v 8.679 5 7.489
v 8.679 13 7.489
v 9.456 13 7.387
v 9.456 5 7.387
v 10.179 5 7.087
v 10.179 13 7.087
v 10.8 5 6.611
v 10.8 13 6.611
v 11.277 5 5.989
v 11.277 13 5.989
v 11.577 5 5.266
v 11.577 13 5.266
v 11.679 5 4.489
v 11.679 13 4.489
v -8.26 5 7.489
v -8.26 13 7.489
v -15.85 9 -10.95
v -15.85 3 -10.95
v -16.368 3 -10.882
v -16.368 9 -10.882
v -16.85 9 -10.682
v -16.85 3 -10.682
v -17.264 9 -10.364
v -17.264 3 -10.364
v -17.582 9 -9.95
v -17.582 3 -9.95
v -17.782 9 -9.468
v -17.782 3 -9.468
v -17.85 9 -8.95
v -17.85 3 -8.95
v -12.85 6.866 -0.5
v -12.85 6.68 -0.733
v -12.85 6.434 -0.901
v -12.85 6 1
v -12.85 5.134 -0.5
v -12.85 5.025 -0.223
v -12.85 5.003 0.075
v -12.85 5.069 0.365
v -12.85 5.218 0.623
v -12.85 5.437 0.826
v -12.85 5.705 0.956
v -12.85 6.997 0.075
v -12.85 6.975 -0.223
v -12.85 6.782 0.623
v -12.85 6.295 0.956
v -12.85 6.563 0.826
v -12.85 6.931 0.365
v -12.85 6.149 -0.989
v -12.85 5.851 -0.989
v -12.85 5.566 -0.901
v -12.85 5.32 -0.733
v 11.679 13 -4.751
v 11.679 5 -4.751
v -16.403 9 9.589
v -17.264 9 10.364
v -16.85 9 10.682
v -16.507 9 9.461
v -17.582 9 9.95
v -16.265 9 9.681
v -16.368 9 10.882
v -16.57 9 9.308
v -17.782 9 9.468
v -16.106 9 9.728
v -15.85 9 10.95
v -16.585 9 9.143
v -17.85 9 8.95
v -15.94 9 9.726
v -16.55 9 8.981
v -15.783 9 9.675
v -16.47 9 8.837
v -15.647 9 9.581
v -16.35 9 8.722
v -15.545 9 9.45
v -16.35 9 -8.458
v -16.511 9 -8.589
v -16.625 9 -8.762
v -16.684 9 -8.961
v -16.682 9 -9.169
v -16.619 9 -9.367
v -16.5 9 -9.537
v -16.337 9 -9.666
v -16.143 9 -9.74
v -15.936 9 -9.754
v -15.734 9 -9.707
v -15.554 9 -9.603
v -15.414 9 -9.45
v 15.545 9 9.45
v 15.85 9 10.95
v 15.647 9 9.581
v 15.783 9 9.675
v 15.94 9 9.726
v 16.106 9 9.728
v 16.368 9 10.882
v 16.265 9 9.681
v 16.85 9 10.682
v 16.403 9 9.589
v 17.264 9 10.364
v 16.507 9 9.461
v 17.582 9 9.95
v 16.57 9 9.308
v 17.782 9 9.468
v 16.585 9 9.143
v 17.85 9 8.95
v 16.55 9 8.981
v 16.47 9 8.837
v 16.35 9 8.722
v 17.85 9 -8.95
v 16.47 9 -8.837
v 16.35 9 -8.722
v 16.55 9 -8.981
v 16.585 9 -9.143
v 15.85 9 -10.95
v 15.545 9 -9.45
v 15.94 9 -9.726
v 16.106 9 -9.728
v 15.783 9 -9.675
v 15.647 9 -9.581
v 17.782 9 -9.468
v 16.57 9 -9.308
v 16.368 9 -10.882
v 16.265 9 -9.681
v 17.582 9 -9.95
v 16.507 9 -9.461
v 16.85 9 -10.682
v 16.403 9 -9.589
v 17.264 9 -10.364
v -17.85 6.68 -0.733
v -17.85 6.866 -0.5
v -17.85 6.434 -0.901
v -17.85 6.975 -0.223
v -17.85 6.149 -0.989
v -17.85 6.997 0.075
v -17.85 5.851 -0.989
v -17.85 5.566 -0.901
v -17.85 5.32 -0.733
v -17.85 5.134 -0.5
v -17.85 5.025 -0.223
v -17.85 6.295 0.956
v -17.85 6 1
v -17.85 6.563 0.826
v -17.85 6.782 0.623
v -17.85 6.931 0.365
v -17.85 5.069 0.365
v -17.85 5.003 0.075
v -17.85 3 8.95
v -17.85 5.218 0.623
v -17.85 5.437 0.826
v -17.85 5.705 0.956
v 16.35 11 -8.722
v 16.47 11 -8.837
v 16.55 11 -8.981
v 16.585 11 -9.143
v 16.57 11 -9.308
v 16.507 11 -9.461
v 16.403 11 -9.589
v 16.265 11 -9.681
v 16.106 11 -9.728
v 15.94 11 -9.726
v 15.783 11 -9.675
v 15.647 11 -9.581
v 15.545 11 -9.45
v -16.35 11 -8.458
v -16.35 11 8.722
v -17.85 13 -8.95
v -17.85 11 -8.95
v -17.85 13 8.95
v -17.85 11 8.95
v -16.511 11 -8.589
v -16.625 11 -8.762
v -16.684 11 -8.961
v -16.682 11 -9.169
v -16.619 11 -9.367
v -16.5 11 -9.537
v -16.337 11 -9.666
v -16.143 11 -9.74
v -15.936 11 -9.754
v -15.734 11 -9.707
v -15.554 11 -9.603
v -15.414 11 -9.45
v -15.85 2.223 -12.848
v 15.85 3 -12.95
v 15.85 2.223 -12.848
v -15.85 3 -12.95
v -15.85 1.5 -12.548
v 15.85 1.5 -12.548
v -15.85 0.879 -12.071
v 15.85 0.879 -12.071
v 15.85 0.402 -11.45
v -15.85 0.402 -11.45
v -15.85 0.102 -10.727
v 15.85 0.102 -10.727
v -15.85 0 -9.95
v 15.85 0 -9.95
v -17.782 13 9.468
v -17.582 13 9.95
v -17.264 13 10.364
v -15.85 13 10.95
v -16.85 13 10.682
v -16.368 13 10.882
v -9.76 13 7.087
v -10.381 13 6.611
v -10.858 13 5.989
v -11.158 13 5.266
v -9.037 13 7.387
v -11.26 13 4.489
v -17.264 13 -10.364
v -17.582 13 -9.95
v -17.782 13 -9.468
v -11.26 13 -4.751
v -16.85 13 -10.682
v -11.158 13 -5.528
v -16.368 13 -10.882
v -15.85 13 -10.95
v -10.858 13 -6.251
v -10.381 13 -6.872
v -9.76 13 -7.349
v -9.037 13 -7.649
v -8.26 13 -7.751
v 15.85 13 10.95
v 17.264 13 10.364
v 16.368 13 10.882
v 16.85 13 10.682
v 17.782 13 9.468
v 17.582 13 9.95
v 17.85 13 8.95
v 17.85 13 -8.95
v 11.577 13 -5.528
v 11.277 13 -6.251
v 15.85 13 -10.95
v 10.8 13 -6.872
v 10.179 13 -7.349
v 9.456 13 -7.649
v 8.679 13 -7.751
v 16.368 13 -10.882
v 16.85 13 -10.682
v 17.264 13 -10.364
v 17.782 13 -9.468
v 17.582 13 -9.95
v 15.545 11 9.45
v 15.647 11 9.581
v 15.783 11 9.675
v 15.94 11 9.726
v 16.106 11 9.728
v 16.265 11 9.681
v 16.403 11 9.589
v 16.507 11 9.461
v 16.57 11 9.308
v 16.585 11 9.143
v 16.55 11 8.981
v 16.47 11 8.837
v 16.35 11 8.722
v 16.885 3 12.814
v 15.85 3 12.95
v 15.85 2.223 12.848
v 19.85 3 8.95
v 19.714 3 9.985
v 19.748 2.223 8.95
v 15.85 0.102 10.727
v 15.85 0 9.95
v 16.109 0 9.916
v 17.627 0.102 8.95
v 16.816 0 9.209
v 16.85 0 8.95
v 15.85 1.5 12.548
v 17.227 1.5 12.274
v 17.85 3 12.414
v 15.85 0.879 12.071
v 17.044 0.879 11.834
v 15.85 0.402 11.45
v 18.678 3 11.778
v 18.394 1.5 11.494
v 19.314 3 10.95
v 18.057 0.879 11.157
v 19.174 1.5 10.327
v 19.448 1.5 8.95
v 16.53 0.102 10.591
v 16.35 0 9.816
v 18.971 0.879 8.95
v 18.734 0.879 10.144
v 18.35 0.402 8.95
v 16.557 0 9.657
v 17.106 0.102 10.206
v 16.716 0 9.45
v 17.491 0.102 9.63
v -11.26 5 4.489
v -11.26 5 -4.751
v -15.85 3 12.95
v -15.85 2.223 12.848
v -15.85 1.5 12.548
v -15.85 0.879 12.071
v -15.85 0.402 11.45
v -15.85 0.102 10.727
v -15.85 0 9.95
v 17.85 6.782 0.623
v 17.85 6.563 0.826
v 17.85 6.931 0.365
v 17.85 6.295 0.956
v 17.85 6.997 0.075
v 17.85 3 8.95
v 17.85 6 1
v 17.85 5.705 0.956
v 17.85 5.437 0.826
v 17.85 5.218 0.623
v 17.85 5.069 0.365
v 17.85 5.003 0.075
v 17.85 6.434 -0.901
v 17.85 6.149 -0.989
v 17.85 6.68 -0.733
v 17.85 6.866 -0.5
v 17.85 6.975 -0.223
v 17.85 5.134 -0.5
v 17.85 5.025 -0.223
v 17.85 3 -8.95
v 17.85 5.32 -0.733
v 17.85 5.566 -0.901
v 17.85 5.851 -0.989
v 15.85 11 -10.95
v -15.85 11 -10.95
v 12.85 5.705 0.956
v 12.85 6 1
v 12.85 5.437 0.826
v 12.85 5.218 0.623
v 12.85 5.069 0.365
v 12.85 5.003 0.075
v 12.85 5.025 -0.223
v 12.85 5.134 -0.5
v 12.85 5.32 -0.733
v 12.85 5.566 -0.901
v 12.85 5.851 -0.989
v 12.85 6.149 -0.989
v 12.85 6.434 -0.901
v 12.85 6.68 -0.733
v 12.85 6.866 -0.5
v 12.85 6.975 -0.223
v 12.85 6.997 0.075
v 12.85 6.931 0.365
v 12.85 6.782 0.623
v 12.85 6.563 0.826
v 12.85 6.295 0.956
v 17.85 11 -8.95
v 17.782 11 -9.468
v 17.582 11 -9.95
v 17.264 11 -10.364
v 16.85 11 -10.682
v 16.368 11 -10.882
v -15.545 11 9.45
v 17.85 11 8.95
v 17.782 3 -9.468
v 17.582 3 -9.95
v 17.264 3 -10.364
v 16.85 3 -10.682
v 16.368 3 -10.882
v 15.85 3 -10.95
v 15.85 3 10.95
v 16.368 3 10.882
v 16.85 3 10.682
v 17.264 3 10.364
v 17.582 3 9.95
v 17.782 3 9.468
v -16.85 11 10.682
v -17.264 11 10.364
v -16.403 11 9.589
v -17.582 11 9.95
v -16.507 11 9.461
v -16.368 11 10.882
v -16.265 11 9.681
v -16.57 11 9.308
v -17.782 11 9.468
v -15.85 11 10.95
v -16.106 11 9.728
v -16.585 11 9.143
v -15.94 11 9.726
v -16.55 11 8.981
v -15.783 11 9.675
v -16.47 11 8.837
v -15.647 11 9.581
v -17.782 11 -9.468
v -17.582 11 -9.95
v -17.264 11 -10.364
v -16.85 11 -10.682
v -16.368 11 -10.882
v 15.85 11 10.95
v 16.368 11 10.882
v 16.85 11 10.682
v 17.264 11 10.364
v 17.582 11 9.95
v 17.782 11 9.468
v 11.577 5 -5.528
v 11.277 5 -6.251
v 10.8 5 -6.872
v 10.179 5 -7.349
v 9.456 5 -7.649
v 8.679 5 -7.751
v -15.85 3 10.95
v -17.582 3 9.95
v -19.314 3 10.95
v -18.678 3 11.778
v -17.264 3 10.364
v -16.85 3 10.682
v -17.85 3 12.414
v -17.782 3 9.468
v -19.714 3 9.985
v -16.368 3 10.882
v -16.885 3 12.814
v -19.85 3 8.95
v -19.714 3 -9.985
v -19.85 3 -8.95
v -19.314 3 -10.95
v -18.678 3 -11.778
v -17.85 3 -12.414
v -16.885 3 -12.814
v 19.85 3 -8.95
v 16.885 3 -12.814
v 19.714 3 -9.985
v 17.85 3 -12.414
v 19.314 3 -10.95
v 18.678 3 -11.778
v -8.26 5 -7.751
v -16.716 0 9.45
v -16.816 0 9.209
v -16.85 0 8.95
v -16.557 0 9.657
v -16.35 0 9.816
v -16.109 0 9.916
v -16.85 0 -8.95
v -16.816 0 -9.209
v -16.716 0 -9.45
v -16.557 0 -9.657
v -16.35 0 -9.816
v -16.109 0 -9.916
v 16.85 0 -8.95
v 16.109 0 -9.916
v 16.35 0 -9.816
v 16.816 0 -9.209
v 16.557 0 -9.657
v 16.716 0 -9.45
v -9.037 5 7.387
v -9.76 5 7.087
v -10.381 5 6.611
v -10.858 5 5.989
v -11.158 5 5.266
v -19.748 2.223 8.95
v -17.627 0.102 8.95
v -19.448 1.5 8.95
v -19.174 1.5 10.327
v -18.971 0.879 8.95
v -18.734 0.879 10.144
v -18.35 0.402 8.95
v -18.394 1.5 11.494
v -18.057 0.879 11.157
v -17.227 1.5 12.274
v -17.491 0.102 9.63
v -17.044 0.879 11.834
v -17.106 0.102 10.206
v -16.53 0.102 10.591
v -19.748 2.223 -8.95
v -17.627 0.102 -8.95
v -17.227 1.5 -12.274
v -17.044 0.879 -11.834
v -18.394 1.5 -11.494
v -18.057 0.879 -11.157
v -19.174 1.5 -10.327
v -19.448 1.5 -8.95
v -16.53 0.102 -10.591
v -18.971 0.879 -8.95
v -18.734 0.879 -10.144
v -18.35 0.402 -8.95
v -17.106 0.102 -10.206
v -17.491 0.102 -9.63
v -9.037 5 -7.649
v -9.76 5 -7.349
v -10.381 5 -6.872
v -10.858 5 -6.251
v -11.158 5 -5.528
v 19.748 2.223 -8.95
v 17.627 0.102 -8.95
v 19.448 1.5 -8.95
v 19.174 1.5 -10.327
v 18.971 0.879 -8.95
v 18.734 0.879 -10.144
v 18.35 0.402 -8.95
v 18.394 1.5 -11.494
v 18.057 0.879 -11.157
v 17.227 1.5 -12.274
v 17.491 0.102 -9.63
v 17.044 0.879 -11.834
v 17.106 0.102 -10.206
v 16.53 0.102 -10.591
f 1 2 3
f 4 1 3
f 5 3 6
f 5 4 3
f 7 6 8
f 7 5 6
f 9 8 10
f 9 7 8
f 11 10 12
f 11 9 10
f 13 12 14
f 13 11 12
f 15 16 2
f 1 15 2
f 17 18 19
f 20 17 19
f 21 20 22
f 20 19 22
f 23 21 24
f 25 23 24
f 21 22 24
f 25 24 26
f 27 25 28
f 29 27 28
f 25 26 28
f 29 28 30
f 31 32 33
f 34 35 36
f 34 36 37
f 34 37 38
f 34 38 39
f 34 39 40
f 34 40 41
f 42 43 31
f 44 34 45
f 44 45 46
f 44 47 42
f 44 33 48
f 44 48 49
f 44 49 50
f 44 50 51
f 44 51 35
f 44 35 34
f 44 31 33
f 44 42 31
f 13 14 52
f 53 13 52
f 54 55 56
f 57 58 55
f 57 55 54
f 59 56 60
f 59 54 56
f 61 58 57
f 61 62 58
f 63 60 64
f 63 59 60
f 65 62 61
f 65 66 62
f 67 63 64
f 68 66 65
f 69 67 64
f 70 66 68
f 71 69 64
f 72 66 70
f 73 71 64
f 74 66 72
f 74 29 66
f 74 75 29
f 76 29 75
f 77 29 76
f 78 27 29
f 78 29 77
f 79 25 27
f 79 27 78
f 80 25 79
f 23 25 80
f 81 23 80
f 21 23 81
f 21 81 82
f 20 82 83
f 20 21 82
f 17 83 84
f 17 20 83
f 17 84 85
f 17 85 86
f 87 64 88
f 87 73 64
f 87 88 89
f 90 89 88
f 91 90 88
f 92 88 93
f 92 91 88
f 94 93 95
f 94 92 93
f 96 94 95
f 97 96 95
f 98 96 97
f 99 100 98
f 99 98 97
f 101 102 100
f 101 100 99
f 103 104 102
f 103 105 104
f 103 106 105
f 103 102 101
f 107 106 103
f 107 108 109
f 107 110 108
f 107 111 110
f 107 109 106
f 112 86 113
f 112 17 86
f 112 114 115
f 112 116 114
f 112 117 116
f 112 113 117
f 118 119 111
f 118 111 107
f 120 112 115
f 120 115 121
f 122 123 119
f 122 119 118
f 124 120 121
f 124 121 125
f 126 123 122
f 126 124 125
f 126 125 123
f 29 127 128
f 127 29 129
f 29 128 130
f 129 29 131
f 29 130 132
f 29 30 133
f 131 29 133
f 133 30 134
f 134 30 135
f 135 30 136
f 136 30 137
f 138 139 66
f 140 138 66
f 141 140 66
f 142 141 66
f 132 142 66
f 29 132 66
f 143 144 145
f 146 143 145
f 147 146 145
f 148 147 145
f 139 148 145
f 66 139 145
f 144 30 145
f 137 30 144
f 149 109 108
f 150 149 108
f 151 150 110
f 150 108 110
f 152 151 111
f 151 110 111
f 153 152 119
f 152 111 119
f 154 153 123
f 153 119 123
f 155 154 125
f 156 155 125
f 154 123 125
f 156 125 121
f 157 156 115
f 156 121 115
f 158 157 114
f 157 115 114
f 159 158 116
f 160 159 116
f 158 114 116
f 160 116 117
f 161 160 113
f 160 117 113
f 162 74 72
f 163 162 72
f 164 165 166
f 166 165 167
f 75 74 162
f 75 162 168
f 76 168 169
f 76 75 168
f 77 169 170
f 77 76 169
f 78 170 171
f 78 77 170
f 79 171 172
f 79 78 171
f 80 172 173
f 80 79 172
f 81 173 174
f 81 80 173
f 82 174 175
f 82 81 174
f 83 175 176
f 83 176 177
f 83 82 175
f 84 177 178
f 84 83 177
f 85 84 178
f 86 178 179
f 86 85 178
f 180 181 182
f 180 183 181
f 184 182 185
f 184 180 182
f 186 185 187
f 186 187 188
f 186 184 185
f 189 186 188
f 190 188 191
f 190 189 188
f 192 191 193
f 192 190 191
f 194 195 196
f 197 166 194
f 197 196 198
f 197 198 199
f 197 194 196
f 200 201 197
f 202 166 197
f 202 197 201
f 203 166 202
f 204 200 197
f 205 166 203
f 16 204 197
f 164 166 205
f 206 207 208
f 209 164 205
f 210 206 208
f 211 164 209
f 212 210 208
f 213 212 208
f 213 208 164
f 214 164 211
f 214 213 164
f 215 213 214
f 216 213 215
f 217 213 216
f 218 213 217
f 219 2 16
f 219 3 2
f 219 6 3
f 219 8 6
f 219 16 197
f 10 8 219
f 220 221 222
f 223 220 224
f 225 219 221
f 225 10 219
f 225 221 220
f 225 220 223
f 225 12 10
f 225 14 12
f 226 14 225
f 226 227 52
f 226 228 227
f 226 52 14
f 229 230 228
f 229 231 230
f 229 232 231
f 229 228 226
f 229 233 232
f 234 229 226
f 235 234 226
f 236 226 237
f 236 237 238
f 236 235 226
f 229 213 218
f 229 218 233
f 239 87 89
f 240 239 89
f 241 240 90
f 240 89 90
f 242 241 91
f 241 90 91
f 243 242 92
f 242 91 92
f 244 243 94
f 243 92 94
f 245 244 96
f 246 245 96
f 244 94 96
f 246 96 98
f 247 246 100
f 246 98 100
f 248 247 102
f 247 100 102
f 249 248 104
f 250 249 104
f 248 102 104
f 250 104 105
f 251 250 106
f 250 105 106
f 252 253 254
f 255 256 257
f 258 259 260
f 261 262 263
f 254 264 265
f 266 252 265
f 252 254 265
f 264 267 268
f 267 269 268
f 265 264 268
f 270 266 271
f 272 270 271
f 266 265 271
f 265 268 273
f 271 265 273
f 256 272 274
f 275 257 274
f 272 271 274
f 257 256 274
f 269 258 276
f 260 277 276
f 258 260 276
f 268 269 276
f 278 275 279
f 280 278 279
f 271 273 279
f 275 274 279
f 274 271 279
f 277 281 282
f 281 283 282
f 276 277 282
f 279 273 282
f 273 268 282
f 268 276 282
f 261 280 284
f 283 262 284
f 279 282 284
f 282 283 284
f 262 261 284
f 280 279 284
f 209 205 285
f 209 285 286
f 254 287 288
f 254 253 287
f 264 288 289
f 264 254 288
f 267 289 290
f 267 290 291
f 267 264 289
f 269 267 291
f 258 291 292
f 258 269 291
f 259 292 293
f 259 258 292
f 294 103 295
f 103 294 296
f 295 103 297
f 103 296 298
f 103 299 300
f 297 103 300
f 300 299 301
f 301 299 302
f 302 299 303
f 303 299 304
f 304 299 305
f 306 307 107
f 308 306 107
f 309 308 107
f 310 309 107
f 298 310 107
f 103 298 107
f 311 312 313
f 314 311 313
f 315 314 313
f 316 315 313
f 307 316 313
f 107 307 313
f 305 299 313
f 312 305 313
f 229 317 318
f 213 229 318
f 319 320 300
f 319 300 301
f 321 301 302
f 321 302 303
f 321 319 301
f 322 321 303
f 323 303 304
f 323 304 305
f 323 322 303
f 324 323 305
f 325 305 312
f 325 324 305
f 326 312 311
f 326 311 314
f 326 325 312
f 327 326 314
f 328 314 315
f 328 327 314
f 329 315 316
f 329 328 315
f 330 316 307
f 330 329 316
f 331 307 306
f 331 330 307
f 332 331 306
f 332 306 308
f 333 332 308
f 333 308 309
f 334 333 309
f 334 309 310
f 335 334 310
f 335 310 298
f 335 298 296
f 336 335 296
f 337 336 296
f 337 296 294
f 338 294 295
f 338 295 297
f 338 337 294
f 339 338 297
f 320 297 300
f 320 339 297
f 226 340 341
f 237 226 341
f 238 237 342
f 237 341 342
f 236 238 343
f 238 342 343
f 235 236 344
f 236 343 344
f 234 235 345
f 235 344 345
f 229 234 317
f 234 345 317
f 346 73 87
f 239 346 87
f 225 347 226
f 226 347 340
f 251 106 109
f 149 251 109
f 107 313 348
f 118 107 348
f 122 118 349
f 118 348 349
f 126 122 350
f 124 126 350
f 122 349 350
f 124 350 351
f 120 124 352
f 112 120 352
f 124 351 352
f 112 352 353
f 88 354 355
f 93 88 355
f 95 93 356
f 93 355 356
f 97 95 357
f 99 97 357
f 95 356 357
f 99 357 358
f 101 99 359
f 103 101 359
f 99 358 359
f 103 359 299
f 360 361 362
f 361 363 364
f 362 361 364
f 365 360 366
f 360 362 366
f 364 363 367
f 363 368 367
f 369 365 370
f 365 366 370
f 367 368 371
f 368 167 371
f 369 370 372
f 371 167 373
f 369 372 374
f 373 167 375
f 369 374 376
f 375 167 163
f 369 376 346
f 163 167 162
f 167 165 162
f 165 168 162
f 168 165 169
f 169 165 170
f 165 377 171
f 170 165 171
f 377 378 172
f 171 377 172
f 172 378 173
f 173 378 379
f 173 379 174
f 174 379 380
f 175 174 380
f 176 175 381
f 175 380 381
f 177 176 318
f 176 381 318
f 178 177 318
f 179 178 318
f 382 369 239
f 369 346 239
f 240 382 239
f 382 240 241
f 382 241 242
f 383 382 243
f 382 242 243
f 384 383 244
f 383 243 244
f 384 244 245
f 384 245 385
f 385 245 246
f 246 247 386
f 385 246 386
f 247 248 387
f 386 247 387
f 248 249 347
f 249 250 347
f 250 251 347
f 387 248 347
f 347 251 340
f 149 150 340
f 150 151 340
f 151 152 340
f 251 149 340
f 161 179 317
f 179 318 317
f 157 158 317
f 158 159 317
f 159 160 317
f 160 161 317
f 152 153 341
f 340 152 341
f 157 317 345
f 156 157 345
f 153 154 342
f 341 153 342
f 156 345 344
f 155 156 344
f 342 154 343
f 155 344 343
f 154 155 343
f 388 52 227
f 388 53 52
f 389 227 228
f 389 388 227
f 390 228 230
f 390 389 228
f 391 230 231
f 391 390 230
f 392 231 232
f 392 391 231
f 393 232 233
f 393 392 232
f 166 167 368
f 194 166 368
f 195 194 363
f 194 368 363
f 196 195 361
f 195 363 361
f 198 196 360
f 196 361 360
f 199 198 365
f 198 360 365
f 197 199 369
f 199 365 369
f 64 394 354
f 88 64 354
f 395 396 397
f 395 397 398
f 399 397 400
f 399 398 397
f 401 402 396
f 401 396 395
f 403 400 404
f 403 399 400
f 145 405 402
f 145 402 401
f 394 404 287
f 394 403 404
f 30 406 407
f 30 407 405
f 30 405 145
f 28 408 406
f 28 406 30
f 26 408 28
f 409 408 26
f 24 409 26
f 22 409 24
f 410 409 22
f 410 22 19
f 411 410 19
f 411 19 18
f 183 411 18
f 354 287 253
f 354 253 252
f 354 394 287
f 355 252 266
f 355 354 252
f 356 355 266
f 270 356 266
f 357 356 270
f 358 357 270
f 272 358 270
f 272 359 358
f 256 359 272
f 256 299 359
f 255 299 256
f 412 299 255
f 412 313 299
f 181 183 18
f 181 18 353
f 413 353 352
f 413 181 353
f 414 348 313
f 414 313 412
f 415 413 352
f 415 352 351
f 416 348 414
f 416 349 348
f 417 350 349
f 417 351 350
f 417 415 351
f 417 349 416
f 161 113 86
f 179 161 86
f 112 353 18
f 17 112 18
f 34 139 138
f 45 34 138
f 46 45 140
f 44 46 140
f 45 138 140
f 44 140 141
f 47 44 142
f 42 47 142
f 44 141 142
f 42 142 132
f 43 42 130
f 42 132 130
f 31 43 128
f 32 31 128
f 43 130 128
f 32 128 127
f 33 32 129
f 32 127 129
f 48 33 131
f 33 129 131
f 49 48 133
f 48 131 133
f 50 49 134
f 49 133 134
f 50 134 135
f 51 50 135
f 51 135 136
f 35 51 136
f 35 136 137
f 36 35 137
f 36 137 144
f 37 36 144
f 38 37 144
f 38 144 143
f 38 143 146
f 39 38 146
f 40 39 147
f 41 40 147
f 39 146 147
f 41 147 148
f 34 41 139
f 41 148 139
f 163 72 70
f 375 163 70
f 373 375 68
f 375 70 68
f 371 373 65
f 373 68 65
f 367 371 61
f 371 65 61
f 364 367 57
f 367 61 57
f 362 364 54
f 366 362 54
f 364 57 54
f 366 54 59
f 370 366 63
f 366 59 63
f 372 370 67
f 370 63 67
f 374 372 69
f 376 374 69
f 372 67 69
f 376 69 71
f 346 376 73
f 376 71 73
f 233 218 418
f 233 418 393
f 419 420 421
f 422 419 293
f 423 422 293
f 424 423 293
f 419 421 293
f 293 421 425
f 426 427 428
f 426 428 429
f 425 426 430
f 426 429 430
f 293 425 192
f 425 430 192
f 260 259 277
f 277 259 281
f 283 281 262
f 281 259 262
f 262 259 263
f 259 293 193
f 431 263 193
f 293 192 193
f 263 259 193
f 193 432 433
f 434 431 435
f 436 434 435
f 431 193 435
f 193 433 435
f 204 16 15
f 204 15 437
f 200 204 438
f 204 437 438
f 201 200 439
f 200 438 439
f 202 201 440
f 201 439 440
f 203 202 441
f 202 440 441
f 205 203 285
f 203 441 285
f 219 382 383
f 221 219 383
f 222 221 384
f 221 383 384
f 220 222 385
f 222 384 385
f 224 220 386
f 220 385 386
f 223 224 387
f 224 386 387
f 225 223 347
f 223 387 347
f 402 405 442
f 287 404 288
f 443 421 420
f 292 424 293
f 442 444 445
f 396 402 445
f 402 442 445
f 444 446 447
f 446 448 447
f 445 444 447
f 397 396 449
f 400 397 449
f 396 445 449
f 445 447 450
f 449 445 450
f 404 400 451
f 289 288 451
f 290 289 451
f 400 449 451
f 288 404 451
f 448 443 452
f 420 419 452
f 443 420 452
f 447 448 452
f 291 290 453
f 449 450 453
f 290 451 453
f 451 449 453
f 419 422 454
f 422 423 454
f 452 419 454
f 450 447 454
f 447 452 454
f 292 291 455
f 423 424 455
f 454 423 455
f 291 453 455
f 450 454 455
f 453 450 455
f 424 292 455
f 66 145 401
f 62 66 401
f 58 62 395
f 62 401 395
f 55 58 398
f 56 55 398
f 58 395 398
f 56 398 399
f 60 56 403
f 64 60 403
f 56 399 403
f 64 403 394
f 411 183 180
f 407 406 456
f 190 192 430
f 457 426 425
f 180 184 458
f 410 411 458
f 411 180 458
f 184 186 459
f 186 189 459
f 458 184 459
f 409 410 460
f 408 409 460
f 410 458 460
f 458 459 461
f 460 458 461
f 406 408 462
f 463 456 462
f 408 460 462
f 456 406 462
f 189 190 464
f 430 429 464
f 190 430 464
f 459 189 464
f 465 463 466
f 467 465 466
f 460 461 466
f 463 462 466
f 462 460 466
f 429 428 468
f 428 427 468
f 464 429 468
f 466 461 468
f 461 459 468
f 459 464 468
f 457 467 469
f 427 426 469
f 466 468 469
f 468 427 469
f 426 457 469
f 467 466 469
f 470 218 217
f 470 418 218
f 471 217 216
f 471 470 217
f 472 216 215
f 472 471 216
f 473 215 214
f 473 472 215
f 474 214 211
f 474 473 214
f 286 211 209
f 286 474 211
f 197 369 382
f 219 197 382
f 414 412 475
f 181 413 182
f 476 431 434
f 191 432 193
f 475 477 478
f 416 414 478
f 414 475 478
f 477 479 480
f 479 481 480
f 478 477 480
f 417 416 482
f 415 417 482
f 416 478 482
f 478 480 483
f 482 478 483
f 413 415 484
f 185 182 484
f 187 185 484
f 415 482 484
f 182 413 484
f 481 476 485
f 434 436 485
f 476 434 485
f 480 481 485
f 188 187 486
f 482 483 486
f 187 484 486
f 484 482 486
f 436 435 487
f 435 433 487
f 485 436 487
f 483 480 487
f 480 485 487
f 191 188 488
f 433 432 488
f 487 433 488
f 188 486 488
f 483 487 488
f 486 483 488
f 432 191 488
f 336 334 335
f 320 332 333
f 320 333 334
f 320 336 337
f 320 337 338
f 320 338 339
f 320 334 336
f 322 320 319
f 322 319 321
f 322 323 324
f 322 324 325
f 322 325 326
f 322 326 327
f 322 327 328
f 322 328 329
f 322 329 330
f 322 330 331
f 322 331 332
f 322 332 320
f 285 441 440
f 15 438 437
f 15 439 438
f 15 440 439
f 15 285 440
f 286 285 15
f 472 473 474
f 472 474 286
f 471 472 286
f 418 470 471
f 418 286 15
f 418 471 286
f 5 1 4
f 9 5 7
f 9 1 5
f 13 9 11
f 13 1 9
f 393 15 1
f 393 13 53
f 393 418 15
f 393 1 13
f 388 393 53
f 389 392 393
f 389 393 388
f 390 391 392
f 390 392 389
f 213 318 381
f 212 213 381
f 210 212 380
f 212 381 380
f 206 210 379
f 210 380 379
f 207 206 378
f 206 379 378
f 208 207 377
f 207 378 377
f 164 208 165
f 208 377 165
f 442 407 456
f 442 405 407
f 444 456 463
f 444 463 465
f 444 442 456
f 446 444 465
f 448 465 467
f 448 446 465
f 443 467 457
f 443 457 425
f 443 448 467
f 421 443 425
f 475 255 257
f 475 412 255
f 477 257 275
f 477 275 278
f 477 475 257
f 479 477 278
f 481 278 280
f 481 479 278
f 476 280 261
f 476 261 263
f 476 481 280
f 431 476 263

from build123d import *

# Parameters (mm, degrees)
SALIENTE_EXTRUIR1_DEPTH  = 3
SALIENTE_EXTRUIR3_DEPTH  = 6
SALIENTE_EXTRUIR4_DEPTH  = 2
SALIENTE_EXTRUIR5_DEPTH  = 2
REDONDEO1_R              = 3
CROQUIS5_R               = 1
CORTAR_EXTRUIR1_DEPTH    = 5
CORTAR_EXTRUIR2_START    = -5
CROQUIS6_R               = 1
CORTAR_EXTRUIR2_DEPTH    = 5
SALIENTE_EXTRUIR6_START  = -5
SALIENTE_EXTRUIR6_DEPTH  = 5
CROQUIS9_W               = 22.939215458
CROQUIS9_H               = 15.240437668
CORTAR_EXTRUIR3_DEPTH    = 8
REDONDEO2_R              = 3
SALIENTE_EXTRUIR13_DEPTH = 2
SALIENTE_EXTRUIR15_DEPTH = 2


with BuildPart() as part:
    # Croquis1 → Saliente-Extruir1 (new body)
    with BuildSketch(Plane(origin=(0, 0, 0), x_dir=(1, 0, 0), z_dir=(0, 1, 0))):
        with BuildLine():
            Line((-15.85, -12.95), (15.85, -12.95))
            ThreePointArc((15.85, -12.95), (18.678427125, -11.778427125), (19.85, -8.95))
            Line((19.85, -8.95), (19.85, 8.95))
            ThreePointArc((19.85, 8.95), (18.678427125, 11.778427125), (15.85, 12.95))
            Line((15.85, 12.95), (-15.85, 12.95))
            ThreePointArc((-15.85, 12.95), (-18.678427125, 11.778427125), (-19.85, 8.95))
            Line((-19.85, 8.95), (-19.85, -8.95))
            ThreePointArc((-19.85, -8.95), (-18.678427125, -11.778427125), (-15.85, -12.95))
        make_face()
    extrude(amount=SALIENTE_EXTRUIR1_DEPTH)

    # Croquis2 → Saliente-Extruir3 (add)
    with BuildSketch(Plane(origin=(0, 3, 0), x_dir=(1, 0, 0), z_dir=(0, 1, 0))):
        with BuildLine():
            Line((-15.85, -10.95), (15.85, -10.95))
            ThreePointArc((15.85, -10.95), (17.264213562, -10.364213562), (17.85, -8.95))
            Line((17.85, -8.95), (17.85, 8.95))
            ThreePointArc((17.85, 8.95), (17.264213562, 10.364213562), (15.85, 10.95))
            Line((15.85, 10.95), (-15.85, 10.95))
            ThreePointArc((-15.85, 10.95), (-17.264213562, 10.364213562), (-17.85, 8.95))
            Line((-17.85, 8.95), (-17.85, -8.95))
            ThreePointArc((-17.85, -8.95), (-17.264213562, -10.364213562), (-15.85, -10.95))
        make_face()
    extrude(amount=SALIENTE_EXTRUIR3_DEPTH)

    # Croquis3 → Saliente-Extruir4 (add)
    with BuildSketch(Plane(origin=(0, 9, 0), x_dir=(1, 0, 0), z_dir=(0, 1, 0))):
        with BuildLine():
            Line((-15.85, -9.45), (15.85, -9.45))
            ThreePointArc((15.85, -9.45), (16.203553391, -9.303553391), (16.35, -8.95))
            Line((16.35, -8.95), (16.35, 8.95))
            ThreePointArc((16.35, 8.95), (16.203553391, 9.303553391), (15.85, 9.45))
            Line((15.85, 9.45), (-15.85, 9.45))
            ThreePointArc((-15.85, 9.45), (-16.203553391, 9.303553391), (-16.35, 8.95))
            Line((-16.35, 8.95), (-16.35, -8.95))
            ThreePointArc((-16.35, -8.95), (-16.203553391, -9.303553391), (-15.85, -9.45))
        make_face()
    extrude(amount=SALIENTE_EXTRUIR4_DEPTH)

    # Croquis4 → Saliente-Extruir5 (add)
    with BuildSketch(Plane(origin=(0, 11, 0), x_dir=(1, 0, 0), z_dir=(0, 1, 0))):
        with BuildLine():
            Line((-15.85, -10.95), (15.85, -10.95))
            ThreePointArc((15.85, -10.95), (17.264213562, -10.364213562), (17.85, -8.95))
            Line((17.85, -8.95), (17.85, 8.95))
            ThreePointArc((17.85, 8.95), (17.264213562, 10.364213562), (15.85, 10.95))
            Line((15.85, 10.95), (-15.85, 10.95))
            ThreePointArc((-15.85, 10.95), (-17.264213562, 10.364213562), (-17.85, 8.95))
            Line((-17.85, 8.95), (-17.85, -8.95))
            ThreePointArc((-17.85, -8.95), (-17.264213562, -10.364213562), (-15.85, -10.95))
        make_face()
    extrude(amount=SALIENTE_EXTRUIR5_DEPTH)

    # Redondeo1
    redondeo1_edges = [part.edges().sort_by_distance(p)[0] for p in [
        (0, 0, -12.95),
        (-18.678427125, 0, -11.778427125),
        (-19.85, 0, 0),
        (-18.678427125, 0, 11.778427125),
        (0, 0, 12.95),
        (18.678427125, 0, 11.778427125),
        (19.85, 0, 0),
        (18.678427125, 0, -11.778427125),
    ]]
    fillet(redondeo1_edges, radius=REDONDEO1_R - 0.0001)  # a hair under: the kernel refuses the full size

    # Croquis5 → Cortar-Extruir1 (cut)
    with BuildSketch(Plane.ZY.offset(17.85)):
        with Locations((0, 6)):
            Circle(CROQUIS5_R)
    extrude(amount=-CORTAR_EXTRUIR1_DEPTH, mode=Mode.SUBTRACT)

    # Croquis6 → Cortar-Extruir2 (cut)
    with BuildSketch(Plane(origin=(17.85, 0, 0), x_dir=(0, 0, -1), z_dir=(1, 0, 0)).offset(CORTAR_EXTRUIR2_START)):
        with Locations(Location((0, 6, 0), (0, 0, 180))):
            Circle(CROQUIS6_R)
    extrude(amount=CORTAR_EXTRUIR2_DEPTH, mode=Mode.SUBTRACT)

    # Croquis8 → Saliente-Extruir6 (add)
    with BuildSketch(Plane(origin=(0, 13, 0), x_dir=(1, 0, 0), z_dir=(0, 1, 0)).offset(SALIENTE_EXTRUIR6_START)):
        with BuildLine():
            ThreePointArc((16.35, 8.95), (16.287739315, 9.387739315), (15.85, 9.45))
            ThreePointArc((15.85, 9.45), (16.203553391, 9.303553391), (16.35, 8.95))
        make_face()
        with BuildLine():
            ThreePointArc((15.85, -9.45), (16.203553391, -9.303553391), (16.35, -8.95))
            ThreePointArc((16.35, -8.95), (16.287739315, -9.387739315), (15.85, -9.45))
        make_face()
        with BuildLine():
            ThreePointArc((-16.35, -8.95), (-16.203553391, -9.303553391), (-15.85, -9.45))
            ThreePointArc((-15.85, -9.45), (-16.287739315, -9.387739315), (-16.35, -8.95))
        make_face()
        with BuildLine():
            ThreePointArc((-16.35, 8.95), (-16.287739315, 9.387739315), (-15.85, 9.45))
            ThreePointArc((-15.85, 9.45), (-16.203553391, 9.303553391), (-16.35, 8.95))
        make_face()
    extrude(amount=SALIENTE_EXTRUIR6_DEPTH)

    # Croquis9 → Cortar-Extruir3 (cut)
    with BuildSketch(Plane(origin=(0, 13, 0), x_dir=(1, 0, 0), z_dir=(0, 1, 0))):
        with Locations((0.209490552, 0.130931595)):
            Rectangle(CROQUIS9_W, CROQUIS9_H)
    extrude(amount=-CORTAR_EXTRUIR3_DEPTH, mode=Mode.SUBTRACT)

    # Redondeo2
    redondeo2_edges = [part.edges().sort_by_distance(p)[0] for p in [
        (11.679098281, 9, 7.489287239),
        (-11.260117177, 9, 7.489287239),
        (-11.260117177, 9, -7.751150429),
        (11.679098281, 9, -7.751150429),
    ]]
    fillet(redondeo2_edges, radius=REDONDEO2_R)

    # Croquis11 → Saliente-Extruir13 (add)
    with BuildSketch(Plane(origin=(0, 9, 0), x_dir=(1, 0, 0), z_dir=(0, 1, 0))):
        with BuildLine():
            Line((-16.35, -8.95), (-16.35, -8.722324592))
            ThreePointArc((-16.35, -8.722324592), (-16.402564717, -9.58947242), (-15.545094105, -9.45))
            Line((-15.545094105, -9.45), (-15.85, -9.45))
            ThreePointArc((-15.85, -9.45), (-16.287739315, -9.387739315), (-16.35, -8.95))
        make_face()
        with BuildLine():
            ThreePointArc((16.35, 8.722324592), (16.402564717, 9.58947242), (15.545094105, 9.45))
            Line((15.545094105, 9.45), (15.85, 9.45))
            ThreePointArc((15.85, 9.45), (16.287739315, 9.387739315), (16.35, 8.95))
            Line((16.35, 8.95), (16.35, 8.722324592))
        make_face()
        with BuildLine():
            Line((15.85, -9.45), (15.545094105, -9.45))
            ThreePointArc((15.545094105, -9.45), (16.402564717, -9.58947242), (16.35, -8.722324592))
            Line((16.35, -8.722324592), (16.35, -8.95))
            ThreePointArc((16.35, -8.95), (16.287739315, -9.387739315), (15.85, -9.45))
        make_face()
    extrude(amount=SALIENTE_EXTRUIR13_DEPTH)

    # Croquis13 → Saliente-Extruir15 (add)
    with BuildSketch(Plane(origin=(0, 9, 0), x_dir=(1, 0, 0), z_dir=(0, 1, 0))):
        with BuildLine():
            Line((-16.35, 8.95), (-16.35, 8.457615485))
            ThreePointArc((-16.35, 8.457615485), (-16.500312948, 9.537460741), (-15.413569935, 9.45))
            Line((-15.413569935, 9.45), (-15.85, 9.45))
            ThreePointArc((-15.85, 9.45), (-16.287739315, 9.387739315), (-16.35, 8.95))
        make_face()
    extrude(amount=SALIENTE_EXTRUIR15_DEPTH)


solid = part.part
